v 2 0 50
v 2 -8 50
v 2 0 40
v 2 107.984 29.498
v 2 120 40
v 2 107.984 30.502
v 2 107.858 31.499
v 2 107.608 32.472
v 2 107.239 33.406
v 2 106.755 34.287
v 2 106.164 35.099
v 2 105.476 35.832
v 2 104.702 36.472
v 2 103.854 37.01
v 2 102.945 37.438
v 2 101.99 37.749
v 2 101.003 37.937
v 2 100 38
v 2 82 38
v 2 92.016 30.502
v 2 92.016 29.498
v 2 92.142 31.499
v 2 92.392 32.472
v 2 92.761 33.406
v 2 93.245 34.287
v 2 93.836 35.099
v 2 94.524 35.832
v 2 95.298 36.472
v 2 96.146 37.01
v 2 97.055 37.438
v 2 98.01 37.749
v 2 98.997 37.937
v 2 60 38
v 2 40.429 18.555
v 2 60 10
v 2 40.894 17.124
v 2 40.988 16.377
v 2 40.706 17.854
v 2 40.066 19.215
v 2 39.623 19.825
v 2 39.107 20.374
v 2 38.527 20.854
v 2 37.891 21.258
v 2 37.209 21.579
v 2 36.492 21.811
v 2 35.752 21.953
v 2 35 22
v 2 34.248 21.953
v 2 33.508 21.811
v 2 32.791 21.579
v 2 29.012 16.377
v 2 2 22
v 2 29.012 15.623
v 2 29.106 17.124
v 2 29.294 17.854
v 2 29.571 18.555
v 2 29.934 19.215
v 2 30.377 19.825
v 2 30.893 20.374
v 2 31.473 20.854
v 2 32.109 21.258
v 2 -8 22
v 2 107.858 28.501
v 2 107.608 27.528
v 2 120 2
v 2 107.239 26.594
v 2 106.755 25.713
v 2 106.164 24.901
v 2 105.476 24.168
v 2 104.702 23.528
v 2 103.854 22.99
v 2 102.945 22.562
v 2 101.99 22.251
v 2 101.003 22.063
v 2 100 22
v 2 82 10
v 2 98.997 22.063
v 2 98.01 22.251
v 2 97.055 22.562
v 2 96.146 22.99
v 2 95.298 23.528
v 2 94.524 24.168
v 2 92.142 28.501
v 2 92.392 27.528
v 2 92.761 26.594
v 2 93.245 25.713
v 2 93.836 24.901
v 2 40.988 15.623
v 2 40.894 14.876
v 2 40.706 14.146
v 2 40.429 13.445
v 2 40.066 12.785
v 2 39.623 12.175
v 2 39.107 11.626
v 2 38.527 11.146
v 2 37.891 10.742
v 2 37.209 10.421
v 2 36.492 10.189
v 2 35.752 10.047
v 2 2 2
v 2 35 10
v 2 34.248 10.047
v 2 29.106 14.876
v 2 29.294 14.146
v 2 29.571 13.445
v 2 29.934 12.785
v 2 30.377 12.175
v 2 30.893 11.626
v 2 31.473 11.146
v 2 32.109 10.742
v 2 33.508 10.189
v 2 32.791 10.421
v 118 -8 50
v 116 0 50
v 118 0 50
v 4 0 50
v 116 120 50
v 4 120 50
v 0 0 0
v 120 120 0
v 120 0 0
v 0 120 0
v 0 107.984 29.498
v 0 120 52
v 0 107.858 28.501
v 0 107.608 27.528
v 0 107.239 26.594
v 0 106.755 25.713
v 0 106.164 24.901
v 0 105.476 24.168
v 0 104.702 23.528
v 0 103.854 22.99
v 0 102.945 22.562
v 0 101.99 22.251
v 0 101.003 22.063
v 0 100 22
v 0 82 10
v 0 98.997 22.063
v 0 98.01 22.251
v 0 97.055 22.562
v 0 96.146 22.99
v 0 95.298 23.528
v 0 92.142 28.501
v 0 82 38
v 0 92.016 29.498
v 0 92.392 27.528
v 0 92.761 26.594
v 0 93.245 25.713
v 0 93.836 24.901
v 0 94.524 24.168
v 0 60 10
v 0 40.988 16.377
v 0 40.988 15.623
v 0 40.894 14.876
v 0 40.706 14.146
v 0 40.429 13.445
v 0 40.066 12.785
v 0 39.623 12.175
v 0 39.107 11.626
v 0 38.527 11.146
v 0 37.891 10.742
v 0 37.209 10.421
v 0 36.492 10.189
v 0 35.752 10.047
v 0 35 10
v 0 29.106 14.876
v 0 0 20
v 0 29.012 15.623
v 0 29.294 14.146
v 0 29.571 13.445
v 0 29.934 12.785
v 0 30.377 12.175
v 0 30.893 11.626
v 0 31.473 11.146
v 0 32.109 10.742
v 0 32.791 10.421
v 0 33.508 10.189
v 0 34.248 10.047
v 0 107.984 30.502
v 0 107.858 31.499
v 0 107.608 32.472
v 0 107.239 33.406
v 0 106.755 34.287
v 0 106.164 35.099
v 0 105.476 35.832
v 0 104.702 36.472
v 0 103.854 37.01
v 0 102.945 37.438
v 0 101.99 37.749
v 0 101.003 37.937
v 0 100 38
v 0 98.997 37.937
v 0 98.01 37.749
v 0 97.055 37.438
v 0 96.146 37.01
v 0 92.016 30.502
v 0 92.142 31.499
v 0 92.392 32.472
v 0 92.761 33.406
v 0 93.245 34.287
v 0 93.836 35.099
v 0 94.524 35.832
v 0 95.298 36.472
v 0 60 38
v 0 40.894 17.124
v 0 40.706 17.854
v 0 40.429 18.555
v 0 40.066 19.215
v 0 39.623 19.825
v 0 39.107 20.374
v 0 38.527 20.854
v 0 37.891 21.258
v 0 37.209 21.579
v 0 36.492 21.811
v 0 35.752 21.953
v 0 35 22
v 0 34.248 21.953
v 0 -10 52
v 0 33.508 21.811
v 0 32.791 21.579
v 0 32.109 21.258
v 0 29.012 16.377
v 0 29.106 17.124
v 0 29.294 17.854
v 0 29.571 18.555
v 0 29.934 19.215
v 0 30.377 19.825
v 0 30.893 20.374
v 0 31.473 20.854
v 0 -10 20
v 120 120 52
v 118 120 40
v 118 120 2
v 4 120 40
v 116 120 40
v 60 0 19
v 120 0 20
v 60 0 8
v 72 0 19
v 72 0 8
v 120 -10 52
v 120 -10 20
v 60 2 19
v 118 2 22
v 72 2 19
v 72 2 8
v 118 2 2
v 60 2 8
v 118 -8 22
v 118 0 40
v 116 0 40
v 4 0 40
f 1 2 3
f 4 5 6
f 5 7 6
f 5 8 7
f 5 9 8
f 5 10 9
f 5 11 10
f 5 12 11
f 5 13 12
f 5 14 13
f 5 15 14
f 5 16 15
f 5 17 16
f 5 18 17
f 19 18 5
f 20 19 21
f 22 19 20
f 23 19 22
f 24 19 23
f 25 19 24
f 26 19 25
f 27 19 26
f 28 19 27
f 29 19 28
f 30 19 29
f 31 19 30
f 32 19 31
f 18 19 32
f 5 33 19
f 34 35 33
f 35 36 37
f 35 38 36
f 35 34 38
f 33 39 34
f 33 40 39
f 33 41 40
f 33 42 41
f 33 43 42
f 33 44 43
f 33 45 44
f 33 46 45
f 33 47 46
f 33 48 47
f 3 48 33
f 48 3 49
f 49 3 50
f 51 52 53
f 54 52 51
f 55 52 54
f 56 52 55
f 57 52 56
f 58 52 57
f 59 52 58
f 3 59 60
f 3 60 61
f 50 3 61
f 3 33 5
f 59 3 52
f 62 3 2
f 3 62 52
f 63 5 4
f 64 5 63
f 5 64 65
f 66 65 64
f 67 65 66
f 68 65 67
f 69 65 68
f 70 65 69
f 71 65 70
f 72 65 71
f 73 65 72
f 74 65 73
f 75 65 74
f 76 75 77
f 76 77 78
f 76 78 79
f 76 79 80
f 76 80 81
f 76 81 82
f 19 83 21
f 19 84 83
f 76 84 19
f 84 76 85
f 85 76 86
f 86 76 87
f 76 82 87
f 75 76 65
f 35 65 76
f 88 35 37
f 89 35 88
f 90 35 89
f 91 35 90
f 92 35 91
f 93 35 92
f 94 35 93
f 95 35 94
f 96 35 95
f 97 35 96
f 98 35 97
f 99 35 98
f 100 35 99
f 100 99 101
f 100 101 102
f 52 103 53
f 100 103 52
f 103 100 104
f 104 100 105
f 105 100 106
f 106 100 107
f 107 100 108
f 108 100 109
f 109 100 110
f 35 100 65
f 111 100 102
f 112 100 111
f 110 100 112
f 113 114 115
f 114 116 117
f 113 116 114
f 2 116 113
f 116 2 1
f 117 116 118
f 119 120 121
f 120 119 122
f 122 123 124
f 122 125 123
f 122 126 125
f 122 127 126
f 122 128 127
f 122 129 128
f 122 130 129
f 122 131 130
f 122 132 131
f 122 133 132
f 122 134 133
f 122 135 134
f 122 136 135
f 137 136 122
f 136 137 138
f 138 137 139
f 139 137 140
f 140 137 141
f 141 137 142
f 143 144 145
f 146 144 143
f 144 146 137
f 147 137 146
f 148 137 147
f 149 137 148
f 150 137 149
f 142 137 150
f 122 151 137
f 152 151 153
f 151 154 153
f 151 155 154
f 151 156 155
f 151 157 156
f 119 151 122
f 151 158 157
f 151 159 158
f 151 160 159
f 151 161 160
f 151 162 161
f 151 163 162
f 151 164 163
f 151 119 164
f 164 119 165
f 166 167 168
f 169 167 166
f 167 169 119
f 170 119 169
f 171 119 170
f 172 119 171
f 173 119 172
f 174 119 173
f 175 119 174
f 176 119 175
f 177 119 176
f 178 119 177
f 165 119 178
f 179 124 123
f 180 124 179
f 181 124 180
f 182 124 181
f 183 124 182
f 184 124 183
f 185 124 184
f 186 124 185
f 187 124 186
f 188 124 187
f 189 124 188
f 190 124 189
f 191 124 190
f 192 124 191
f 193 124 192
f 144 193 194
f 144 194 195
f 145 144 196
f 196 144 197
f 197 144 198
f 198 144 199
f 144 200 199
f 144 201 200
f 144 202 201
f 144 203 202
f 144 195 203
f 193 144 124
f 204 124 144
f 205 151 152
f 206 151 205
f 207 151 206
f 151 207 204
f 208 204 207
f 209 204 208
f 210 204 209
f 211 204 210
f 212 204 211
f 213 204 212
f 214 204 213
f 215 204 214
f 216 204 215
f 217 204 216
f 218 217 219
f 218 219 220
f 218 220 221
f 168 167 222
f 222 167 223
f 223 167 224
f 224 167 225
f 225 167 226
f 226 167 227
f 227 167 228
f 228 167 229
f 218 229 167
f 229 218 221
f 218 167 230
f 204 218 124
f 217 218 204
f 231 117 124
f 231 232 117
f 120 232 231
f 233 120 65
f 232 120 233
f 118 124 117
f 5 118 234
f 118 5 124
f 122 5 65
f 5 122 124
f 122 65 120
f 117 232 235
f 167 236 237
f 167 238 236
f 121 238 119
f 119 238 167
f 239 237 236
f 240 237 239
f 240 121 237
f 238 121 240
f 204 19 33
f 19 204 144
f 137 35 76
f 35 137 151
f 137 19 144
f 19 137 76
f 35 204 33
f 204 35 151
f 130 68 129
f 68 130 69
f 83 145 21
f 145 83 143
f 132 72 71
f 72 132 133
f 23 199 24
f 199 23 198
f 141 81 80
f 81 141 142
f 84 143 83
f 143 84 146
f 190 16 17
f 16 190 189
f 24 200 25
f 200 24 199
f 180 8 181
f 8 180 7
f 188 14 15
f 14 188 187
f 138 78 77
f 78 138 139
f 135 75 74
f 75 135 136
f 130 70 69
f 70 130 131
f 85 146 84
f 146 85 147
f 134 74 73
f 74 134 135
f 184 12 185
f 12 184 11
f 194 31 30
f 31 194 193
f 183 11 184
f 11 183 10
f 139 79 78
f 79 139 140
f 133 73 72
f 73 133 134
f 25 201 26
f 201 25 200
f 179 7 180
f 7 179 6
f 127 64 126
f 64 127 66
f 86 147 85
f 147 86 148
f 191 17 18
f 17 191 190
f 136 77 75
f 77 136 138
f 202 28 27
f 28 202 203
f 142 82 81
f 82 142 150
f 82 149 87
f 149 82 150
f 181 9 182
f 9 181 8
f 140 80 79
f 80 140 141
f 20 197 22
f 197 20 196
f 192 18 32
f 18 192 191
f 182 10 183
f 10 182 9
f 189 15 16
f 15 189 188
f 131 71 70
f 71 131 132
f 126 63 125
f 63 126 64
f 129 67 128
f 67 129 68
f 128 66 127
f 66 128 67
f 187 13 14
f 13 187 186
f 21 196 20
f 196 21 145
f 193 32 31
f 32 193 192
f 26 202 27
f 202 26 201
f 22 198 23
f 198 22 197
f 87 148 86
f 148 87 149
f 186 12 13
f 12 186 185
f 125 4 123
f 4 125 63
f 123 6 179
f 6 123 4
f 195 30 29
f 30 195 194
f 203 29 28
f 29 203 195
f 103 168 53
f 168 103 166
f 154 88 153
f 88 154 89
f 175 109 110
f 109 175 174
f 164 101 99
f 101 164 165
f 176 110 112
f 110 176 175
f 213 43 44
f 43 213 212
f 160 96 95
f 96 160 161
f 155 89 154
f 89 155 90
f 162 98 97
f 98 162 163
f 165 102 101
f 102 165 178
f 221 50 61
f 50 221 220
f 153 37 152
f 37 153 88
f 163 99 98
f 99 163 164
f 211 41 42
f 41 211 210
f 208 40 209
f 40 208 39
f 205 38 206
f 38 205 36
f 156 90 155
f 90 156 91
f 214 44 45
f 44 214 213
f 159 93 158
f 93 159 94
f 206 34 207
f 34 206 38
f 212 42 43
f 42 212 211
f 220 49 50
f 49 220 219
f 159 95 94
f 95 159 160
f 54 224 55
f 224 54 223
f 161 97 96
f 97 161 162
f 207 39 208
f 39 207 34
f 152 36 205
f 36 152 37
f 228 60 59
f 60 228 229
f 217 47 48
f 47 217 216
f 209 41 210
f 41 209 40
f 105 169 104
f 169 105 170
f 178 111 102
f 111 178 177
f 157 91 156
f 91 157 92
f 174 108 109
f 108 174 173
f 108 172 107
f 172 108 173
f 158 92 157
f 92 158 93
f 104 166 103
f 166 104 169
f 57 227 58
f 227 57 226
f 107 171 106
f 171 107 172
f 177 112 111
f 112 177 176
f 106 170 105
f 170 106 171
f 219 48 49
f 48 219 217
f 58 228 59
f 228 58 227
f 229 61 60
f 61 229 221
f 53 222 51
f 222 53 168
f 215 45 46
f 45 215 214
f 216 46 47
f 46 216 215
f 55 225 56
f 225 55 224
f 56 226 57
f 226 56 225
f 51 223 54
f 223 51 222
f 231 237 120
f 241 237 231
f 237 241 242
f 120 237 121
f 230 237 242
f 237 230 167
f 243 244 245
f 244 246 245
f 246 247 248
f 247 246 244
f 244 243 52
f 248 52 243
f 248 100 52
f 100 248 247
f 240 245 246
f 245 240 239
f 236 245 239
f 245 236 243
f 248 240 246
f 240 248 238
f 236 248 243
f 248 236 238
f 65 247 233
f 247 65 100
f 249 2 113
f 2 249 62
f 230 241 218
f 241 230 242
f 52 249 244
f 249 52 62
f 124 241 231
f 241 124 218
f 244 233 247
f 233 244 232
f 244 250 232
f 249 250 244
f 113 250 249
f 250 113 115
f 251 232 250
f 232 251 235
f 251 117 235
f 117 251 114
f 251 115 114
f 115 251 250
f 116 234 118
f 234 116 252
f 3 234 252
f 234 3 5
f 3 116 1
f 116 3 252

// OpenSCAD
$fn = 50;

show_base = true;
show_cover = true;

if (show_base) {
	// bottom
	cube([120, 120, 2]);
	
	// back
	difference() {
		cube([2, 120, 50]);
		// 12 pin connector
		translate([-0.5, 60, 10]) cube([3, 22, 28]);
		// button
		translate([-0.5, 100, 30]) rotate([0, 90, 0]) cylinder(r = 8, h = 3);
		// power plug
		translate([-0.5, 35, 16]) rotate([0, 90, 0]) cylinder(r = 6, h = 3);
	}
	
	// extension left
	translate([0, -10, 20])
	cube([120, 2, 30]);
	
	// extension back
	translate([0, -10, 20])
	cube([2, 10, 30]);
	
	// extension bottom
	translate([0, -10, 20])
	cube([120, 12, 2]);
	
	// front bottom
	difference() {
		cube([120, 2, 20]);
		// arduino usb
		translate([60, -0.5, 8]) cube([12, 3, 11]);
	}
}

push_up = 0;
if (show_cover) {
	// top
	translate([0, -10, 50 + push_up])
	cube([120, 130, 2]);
	
	translate([116, 0, 40 + push_up])
	cube([2, 120, 10]);
	
	translate([2, 0, 40 + push_up])
	cube([2, 120, 10]);

	translate([118, 0, 0])
	cube([2, 120, 50]);

	translate([118, -10, 20])
	cube([2, 10, 30]);
	
}
